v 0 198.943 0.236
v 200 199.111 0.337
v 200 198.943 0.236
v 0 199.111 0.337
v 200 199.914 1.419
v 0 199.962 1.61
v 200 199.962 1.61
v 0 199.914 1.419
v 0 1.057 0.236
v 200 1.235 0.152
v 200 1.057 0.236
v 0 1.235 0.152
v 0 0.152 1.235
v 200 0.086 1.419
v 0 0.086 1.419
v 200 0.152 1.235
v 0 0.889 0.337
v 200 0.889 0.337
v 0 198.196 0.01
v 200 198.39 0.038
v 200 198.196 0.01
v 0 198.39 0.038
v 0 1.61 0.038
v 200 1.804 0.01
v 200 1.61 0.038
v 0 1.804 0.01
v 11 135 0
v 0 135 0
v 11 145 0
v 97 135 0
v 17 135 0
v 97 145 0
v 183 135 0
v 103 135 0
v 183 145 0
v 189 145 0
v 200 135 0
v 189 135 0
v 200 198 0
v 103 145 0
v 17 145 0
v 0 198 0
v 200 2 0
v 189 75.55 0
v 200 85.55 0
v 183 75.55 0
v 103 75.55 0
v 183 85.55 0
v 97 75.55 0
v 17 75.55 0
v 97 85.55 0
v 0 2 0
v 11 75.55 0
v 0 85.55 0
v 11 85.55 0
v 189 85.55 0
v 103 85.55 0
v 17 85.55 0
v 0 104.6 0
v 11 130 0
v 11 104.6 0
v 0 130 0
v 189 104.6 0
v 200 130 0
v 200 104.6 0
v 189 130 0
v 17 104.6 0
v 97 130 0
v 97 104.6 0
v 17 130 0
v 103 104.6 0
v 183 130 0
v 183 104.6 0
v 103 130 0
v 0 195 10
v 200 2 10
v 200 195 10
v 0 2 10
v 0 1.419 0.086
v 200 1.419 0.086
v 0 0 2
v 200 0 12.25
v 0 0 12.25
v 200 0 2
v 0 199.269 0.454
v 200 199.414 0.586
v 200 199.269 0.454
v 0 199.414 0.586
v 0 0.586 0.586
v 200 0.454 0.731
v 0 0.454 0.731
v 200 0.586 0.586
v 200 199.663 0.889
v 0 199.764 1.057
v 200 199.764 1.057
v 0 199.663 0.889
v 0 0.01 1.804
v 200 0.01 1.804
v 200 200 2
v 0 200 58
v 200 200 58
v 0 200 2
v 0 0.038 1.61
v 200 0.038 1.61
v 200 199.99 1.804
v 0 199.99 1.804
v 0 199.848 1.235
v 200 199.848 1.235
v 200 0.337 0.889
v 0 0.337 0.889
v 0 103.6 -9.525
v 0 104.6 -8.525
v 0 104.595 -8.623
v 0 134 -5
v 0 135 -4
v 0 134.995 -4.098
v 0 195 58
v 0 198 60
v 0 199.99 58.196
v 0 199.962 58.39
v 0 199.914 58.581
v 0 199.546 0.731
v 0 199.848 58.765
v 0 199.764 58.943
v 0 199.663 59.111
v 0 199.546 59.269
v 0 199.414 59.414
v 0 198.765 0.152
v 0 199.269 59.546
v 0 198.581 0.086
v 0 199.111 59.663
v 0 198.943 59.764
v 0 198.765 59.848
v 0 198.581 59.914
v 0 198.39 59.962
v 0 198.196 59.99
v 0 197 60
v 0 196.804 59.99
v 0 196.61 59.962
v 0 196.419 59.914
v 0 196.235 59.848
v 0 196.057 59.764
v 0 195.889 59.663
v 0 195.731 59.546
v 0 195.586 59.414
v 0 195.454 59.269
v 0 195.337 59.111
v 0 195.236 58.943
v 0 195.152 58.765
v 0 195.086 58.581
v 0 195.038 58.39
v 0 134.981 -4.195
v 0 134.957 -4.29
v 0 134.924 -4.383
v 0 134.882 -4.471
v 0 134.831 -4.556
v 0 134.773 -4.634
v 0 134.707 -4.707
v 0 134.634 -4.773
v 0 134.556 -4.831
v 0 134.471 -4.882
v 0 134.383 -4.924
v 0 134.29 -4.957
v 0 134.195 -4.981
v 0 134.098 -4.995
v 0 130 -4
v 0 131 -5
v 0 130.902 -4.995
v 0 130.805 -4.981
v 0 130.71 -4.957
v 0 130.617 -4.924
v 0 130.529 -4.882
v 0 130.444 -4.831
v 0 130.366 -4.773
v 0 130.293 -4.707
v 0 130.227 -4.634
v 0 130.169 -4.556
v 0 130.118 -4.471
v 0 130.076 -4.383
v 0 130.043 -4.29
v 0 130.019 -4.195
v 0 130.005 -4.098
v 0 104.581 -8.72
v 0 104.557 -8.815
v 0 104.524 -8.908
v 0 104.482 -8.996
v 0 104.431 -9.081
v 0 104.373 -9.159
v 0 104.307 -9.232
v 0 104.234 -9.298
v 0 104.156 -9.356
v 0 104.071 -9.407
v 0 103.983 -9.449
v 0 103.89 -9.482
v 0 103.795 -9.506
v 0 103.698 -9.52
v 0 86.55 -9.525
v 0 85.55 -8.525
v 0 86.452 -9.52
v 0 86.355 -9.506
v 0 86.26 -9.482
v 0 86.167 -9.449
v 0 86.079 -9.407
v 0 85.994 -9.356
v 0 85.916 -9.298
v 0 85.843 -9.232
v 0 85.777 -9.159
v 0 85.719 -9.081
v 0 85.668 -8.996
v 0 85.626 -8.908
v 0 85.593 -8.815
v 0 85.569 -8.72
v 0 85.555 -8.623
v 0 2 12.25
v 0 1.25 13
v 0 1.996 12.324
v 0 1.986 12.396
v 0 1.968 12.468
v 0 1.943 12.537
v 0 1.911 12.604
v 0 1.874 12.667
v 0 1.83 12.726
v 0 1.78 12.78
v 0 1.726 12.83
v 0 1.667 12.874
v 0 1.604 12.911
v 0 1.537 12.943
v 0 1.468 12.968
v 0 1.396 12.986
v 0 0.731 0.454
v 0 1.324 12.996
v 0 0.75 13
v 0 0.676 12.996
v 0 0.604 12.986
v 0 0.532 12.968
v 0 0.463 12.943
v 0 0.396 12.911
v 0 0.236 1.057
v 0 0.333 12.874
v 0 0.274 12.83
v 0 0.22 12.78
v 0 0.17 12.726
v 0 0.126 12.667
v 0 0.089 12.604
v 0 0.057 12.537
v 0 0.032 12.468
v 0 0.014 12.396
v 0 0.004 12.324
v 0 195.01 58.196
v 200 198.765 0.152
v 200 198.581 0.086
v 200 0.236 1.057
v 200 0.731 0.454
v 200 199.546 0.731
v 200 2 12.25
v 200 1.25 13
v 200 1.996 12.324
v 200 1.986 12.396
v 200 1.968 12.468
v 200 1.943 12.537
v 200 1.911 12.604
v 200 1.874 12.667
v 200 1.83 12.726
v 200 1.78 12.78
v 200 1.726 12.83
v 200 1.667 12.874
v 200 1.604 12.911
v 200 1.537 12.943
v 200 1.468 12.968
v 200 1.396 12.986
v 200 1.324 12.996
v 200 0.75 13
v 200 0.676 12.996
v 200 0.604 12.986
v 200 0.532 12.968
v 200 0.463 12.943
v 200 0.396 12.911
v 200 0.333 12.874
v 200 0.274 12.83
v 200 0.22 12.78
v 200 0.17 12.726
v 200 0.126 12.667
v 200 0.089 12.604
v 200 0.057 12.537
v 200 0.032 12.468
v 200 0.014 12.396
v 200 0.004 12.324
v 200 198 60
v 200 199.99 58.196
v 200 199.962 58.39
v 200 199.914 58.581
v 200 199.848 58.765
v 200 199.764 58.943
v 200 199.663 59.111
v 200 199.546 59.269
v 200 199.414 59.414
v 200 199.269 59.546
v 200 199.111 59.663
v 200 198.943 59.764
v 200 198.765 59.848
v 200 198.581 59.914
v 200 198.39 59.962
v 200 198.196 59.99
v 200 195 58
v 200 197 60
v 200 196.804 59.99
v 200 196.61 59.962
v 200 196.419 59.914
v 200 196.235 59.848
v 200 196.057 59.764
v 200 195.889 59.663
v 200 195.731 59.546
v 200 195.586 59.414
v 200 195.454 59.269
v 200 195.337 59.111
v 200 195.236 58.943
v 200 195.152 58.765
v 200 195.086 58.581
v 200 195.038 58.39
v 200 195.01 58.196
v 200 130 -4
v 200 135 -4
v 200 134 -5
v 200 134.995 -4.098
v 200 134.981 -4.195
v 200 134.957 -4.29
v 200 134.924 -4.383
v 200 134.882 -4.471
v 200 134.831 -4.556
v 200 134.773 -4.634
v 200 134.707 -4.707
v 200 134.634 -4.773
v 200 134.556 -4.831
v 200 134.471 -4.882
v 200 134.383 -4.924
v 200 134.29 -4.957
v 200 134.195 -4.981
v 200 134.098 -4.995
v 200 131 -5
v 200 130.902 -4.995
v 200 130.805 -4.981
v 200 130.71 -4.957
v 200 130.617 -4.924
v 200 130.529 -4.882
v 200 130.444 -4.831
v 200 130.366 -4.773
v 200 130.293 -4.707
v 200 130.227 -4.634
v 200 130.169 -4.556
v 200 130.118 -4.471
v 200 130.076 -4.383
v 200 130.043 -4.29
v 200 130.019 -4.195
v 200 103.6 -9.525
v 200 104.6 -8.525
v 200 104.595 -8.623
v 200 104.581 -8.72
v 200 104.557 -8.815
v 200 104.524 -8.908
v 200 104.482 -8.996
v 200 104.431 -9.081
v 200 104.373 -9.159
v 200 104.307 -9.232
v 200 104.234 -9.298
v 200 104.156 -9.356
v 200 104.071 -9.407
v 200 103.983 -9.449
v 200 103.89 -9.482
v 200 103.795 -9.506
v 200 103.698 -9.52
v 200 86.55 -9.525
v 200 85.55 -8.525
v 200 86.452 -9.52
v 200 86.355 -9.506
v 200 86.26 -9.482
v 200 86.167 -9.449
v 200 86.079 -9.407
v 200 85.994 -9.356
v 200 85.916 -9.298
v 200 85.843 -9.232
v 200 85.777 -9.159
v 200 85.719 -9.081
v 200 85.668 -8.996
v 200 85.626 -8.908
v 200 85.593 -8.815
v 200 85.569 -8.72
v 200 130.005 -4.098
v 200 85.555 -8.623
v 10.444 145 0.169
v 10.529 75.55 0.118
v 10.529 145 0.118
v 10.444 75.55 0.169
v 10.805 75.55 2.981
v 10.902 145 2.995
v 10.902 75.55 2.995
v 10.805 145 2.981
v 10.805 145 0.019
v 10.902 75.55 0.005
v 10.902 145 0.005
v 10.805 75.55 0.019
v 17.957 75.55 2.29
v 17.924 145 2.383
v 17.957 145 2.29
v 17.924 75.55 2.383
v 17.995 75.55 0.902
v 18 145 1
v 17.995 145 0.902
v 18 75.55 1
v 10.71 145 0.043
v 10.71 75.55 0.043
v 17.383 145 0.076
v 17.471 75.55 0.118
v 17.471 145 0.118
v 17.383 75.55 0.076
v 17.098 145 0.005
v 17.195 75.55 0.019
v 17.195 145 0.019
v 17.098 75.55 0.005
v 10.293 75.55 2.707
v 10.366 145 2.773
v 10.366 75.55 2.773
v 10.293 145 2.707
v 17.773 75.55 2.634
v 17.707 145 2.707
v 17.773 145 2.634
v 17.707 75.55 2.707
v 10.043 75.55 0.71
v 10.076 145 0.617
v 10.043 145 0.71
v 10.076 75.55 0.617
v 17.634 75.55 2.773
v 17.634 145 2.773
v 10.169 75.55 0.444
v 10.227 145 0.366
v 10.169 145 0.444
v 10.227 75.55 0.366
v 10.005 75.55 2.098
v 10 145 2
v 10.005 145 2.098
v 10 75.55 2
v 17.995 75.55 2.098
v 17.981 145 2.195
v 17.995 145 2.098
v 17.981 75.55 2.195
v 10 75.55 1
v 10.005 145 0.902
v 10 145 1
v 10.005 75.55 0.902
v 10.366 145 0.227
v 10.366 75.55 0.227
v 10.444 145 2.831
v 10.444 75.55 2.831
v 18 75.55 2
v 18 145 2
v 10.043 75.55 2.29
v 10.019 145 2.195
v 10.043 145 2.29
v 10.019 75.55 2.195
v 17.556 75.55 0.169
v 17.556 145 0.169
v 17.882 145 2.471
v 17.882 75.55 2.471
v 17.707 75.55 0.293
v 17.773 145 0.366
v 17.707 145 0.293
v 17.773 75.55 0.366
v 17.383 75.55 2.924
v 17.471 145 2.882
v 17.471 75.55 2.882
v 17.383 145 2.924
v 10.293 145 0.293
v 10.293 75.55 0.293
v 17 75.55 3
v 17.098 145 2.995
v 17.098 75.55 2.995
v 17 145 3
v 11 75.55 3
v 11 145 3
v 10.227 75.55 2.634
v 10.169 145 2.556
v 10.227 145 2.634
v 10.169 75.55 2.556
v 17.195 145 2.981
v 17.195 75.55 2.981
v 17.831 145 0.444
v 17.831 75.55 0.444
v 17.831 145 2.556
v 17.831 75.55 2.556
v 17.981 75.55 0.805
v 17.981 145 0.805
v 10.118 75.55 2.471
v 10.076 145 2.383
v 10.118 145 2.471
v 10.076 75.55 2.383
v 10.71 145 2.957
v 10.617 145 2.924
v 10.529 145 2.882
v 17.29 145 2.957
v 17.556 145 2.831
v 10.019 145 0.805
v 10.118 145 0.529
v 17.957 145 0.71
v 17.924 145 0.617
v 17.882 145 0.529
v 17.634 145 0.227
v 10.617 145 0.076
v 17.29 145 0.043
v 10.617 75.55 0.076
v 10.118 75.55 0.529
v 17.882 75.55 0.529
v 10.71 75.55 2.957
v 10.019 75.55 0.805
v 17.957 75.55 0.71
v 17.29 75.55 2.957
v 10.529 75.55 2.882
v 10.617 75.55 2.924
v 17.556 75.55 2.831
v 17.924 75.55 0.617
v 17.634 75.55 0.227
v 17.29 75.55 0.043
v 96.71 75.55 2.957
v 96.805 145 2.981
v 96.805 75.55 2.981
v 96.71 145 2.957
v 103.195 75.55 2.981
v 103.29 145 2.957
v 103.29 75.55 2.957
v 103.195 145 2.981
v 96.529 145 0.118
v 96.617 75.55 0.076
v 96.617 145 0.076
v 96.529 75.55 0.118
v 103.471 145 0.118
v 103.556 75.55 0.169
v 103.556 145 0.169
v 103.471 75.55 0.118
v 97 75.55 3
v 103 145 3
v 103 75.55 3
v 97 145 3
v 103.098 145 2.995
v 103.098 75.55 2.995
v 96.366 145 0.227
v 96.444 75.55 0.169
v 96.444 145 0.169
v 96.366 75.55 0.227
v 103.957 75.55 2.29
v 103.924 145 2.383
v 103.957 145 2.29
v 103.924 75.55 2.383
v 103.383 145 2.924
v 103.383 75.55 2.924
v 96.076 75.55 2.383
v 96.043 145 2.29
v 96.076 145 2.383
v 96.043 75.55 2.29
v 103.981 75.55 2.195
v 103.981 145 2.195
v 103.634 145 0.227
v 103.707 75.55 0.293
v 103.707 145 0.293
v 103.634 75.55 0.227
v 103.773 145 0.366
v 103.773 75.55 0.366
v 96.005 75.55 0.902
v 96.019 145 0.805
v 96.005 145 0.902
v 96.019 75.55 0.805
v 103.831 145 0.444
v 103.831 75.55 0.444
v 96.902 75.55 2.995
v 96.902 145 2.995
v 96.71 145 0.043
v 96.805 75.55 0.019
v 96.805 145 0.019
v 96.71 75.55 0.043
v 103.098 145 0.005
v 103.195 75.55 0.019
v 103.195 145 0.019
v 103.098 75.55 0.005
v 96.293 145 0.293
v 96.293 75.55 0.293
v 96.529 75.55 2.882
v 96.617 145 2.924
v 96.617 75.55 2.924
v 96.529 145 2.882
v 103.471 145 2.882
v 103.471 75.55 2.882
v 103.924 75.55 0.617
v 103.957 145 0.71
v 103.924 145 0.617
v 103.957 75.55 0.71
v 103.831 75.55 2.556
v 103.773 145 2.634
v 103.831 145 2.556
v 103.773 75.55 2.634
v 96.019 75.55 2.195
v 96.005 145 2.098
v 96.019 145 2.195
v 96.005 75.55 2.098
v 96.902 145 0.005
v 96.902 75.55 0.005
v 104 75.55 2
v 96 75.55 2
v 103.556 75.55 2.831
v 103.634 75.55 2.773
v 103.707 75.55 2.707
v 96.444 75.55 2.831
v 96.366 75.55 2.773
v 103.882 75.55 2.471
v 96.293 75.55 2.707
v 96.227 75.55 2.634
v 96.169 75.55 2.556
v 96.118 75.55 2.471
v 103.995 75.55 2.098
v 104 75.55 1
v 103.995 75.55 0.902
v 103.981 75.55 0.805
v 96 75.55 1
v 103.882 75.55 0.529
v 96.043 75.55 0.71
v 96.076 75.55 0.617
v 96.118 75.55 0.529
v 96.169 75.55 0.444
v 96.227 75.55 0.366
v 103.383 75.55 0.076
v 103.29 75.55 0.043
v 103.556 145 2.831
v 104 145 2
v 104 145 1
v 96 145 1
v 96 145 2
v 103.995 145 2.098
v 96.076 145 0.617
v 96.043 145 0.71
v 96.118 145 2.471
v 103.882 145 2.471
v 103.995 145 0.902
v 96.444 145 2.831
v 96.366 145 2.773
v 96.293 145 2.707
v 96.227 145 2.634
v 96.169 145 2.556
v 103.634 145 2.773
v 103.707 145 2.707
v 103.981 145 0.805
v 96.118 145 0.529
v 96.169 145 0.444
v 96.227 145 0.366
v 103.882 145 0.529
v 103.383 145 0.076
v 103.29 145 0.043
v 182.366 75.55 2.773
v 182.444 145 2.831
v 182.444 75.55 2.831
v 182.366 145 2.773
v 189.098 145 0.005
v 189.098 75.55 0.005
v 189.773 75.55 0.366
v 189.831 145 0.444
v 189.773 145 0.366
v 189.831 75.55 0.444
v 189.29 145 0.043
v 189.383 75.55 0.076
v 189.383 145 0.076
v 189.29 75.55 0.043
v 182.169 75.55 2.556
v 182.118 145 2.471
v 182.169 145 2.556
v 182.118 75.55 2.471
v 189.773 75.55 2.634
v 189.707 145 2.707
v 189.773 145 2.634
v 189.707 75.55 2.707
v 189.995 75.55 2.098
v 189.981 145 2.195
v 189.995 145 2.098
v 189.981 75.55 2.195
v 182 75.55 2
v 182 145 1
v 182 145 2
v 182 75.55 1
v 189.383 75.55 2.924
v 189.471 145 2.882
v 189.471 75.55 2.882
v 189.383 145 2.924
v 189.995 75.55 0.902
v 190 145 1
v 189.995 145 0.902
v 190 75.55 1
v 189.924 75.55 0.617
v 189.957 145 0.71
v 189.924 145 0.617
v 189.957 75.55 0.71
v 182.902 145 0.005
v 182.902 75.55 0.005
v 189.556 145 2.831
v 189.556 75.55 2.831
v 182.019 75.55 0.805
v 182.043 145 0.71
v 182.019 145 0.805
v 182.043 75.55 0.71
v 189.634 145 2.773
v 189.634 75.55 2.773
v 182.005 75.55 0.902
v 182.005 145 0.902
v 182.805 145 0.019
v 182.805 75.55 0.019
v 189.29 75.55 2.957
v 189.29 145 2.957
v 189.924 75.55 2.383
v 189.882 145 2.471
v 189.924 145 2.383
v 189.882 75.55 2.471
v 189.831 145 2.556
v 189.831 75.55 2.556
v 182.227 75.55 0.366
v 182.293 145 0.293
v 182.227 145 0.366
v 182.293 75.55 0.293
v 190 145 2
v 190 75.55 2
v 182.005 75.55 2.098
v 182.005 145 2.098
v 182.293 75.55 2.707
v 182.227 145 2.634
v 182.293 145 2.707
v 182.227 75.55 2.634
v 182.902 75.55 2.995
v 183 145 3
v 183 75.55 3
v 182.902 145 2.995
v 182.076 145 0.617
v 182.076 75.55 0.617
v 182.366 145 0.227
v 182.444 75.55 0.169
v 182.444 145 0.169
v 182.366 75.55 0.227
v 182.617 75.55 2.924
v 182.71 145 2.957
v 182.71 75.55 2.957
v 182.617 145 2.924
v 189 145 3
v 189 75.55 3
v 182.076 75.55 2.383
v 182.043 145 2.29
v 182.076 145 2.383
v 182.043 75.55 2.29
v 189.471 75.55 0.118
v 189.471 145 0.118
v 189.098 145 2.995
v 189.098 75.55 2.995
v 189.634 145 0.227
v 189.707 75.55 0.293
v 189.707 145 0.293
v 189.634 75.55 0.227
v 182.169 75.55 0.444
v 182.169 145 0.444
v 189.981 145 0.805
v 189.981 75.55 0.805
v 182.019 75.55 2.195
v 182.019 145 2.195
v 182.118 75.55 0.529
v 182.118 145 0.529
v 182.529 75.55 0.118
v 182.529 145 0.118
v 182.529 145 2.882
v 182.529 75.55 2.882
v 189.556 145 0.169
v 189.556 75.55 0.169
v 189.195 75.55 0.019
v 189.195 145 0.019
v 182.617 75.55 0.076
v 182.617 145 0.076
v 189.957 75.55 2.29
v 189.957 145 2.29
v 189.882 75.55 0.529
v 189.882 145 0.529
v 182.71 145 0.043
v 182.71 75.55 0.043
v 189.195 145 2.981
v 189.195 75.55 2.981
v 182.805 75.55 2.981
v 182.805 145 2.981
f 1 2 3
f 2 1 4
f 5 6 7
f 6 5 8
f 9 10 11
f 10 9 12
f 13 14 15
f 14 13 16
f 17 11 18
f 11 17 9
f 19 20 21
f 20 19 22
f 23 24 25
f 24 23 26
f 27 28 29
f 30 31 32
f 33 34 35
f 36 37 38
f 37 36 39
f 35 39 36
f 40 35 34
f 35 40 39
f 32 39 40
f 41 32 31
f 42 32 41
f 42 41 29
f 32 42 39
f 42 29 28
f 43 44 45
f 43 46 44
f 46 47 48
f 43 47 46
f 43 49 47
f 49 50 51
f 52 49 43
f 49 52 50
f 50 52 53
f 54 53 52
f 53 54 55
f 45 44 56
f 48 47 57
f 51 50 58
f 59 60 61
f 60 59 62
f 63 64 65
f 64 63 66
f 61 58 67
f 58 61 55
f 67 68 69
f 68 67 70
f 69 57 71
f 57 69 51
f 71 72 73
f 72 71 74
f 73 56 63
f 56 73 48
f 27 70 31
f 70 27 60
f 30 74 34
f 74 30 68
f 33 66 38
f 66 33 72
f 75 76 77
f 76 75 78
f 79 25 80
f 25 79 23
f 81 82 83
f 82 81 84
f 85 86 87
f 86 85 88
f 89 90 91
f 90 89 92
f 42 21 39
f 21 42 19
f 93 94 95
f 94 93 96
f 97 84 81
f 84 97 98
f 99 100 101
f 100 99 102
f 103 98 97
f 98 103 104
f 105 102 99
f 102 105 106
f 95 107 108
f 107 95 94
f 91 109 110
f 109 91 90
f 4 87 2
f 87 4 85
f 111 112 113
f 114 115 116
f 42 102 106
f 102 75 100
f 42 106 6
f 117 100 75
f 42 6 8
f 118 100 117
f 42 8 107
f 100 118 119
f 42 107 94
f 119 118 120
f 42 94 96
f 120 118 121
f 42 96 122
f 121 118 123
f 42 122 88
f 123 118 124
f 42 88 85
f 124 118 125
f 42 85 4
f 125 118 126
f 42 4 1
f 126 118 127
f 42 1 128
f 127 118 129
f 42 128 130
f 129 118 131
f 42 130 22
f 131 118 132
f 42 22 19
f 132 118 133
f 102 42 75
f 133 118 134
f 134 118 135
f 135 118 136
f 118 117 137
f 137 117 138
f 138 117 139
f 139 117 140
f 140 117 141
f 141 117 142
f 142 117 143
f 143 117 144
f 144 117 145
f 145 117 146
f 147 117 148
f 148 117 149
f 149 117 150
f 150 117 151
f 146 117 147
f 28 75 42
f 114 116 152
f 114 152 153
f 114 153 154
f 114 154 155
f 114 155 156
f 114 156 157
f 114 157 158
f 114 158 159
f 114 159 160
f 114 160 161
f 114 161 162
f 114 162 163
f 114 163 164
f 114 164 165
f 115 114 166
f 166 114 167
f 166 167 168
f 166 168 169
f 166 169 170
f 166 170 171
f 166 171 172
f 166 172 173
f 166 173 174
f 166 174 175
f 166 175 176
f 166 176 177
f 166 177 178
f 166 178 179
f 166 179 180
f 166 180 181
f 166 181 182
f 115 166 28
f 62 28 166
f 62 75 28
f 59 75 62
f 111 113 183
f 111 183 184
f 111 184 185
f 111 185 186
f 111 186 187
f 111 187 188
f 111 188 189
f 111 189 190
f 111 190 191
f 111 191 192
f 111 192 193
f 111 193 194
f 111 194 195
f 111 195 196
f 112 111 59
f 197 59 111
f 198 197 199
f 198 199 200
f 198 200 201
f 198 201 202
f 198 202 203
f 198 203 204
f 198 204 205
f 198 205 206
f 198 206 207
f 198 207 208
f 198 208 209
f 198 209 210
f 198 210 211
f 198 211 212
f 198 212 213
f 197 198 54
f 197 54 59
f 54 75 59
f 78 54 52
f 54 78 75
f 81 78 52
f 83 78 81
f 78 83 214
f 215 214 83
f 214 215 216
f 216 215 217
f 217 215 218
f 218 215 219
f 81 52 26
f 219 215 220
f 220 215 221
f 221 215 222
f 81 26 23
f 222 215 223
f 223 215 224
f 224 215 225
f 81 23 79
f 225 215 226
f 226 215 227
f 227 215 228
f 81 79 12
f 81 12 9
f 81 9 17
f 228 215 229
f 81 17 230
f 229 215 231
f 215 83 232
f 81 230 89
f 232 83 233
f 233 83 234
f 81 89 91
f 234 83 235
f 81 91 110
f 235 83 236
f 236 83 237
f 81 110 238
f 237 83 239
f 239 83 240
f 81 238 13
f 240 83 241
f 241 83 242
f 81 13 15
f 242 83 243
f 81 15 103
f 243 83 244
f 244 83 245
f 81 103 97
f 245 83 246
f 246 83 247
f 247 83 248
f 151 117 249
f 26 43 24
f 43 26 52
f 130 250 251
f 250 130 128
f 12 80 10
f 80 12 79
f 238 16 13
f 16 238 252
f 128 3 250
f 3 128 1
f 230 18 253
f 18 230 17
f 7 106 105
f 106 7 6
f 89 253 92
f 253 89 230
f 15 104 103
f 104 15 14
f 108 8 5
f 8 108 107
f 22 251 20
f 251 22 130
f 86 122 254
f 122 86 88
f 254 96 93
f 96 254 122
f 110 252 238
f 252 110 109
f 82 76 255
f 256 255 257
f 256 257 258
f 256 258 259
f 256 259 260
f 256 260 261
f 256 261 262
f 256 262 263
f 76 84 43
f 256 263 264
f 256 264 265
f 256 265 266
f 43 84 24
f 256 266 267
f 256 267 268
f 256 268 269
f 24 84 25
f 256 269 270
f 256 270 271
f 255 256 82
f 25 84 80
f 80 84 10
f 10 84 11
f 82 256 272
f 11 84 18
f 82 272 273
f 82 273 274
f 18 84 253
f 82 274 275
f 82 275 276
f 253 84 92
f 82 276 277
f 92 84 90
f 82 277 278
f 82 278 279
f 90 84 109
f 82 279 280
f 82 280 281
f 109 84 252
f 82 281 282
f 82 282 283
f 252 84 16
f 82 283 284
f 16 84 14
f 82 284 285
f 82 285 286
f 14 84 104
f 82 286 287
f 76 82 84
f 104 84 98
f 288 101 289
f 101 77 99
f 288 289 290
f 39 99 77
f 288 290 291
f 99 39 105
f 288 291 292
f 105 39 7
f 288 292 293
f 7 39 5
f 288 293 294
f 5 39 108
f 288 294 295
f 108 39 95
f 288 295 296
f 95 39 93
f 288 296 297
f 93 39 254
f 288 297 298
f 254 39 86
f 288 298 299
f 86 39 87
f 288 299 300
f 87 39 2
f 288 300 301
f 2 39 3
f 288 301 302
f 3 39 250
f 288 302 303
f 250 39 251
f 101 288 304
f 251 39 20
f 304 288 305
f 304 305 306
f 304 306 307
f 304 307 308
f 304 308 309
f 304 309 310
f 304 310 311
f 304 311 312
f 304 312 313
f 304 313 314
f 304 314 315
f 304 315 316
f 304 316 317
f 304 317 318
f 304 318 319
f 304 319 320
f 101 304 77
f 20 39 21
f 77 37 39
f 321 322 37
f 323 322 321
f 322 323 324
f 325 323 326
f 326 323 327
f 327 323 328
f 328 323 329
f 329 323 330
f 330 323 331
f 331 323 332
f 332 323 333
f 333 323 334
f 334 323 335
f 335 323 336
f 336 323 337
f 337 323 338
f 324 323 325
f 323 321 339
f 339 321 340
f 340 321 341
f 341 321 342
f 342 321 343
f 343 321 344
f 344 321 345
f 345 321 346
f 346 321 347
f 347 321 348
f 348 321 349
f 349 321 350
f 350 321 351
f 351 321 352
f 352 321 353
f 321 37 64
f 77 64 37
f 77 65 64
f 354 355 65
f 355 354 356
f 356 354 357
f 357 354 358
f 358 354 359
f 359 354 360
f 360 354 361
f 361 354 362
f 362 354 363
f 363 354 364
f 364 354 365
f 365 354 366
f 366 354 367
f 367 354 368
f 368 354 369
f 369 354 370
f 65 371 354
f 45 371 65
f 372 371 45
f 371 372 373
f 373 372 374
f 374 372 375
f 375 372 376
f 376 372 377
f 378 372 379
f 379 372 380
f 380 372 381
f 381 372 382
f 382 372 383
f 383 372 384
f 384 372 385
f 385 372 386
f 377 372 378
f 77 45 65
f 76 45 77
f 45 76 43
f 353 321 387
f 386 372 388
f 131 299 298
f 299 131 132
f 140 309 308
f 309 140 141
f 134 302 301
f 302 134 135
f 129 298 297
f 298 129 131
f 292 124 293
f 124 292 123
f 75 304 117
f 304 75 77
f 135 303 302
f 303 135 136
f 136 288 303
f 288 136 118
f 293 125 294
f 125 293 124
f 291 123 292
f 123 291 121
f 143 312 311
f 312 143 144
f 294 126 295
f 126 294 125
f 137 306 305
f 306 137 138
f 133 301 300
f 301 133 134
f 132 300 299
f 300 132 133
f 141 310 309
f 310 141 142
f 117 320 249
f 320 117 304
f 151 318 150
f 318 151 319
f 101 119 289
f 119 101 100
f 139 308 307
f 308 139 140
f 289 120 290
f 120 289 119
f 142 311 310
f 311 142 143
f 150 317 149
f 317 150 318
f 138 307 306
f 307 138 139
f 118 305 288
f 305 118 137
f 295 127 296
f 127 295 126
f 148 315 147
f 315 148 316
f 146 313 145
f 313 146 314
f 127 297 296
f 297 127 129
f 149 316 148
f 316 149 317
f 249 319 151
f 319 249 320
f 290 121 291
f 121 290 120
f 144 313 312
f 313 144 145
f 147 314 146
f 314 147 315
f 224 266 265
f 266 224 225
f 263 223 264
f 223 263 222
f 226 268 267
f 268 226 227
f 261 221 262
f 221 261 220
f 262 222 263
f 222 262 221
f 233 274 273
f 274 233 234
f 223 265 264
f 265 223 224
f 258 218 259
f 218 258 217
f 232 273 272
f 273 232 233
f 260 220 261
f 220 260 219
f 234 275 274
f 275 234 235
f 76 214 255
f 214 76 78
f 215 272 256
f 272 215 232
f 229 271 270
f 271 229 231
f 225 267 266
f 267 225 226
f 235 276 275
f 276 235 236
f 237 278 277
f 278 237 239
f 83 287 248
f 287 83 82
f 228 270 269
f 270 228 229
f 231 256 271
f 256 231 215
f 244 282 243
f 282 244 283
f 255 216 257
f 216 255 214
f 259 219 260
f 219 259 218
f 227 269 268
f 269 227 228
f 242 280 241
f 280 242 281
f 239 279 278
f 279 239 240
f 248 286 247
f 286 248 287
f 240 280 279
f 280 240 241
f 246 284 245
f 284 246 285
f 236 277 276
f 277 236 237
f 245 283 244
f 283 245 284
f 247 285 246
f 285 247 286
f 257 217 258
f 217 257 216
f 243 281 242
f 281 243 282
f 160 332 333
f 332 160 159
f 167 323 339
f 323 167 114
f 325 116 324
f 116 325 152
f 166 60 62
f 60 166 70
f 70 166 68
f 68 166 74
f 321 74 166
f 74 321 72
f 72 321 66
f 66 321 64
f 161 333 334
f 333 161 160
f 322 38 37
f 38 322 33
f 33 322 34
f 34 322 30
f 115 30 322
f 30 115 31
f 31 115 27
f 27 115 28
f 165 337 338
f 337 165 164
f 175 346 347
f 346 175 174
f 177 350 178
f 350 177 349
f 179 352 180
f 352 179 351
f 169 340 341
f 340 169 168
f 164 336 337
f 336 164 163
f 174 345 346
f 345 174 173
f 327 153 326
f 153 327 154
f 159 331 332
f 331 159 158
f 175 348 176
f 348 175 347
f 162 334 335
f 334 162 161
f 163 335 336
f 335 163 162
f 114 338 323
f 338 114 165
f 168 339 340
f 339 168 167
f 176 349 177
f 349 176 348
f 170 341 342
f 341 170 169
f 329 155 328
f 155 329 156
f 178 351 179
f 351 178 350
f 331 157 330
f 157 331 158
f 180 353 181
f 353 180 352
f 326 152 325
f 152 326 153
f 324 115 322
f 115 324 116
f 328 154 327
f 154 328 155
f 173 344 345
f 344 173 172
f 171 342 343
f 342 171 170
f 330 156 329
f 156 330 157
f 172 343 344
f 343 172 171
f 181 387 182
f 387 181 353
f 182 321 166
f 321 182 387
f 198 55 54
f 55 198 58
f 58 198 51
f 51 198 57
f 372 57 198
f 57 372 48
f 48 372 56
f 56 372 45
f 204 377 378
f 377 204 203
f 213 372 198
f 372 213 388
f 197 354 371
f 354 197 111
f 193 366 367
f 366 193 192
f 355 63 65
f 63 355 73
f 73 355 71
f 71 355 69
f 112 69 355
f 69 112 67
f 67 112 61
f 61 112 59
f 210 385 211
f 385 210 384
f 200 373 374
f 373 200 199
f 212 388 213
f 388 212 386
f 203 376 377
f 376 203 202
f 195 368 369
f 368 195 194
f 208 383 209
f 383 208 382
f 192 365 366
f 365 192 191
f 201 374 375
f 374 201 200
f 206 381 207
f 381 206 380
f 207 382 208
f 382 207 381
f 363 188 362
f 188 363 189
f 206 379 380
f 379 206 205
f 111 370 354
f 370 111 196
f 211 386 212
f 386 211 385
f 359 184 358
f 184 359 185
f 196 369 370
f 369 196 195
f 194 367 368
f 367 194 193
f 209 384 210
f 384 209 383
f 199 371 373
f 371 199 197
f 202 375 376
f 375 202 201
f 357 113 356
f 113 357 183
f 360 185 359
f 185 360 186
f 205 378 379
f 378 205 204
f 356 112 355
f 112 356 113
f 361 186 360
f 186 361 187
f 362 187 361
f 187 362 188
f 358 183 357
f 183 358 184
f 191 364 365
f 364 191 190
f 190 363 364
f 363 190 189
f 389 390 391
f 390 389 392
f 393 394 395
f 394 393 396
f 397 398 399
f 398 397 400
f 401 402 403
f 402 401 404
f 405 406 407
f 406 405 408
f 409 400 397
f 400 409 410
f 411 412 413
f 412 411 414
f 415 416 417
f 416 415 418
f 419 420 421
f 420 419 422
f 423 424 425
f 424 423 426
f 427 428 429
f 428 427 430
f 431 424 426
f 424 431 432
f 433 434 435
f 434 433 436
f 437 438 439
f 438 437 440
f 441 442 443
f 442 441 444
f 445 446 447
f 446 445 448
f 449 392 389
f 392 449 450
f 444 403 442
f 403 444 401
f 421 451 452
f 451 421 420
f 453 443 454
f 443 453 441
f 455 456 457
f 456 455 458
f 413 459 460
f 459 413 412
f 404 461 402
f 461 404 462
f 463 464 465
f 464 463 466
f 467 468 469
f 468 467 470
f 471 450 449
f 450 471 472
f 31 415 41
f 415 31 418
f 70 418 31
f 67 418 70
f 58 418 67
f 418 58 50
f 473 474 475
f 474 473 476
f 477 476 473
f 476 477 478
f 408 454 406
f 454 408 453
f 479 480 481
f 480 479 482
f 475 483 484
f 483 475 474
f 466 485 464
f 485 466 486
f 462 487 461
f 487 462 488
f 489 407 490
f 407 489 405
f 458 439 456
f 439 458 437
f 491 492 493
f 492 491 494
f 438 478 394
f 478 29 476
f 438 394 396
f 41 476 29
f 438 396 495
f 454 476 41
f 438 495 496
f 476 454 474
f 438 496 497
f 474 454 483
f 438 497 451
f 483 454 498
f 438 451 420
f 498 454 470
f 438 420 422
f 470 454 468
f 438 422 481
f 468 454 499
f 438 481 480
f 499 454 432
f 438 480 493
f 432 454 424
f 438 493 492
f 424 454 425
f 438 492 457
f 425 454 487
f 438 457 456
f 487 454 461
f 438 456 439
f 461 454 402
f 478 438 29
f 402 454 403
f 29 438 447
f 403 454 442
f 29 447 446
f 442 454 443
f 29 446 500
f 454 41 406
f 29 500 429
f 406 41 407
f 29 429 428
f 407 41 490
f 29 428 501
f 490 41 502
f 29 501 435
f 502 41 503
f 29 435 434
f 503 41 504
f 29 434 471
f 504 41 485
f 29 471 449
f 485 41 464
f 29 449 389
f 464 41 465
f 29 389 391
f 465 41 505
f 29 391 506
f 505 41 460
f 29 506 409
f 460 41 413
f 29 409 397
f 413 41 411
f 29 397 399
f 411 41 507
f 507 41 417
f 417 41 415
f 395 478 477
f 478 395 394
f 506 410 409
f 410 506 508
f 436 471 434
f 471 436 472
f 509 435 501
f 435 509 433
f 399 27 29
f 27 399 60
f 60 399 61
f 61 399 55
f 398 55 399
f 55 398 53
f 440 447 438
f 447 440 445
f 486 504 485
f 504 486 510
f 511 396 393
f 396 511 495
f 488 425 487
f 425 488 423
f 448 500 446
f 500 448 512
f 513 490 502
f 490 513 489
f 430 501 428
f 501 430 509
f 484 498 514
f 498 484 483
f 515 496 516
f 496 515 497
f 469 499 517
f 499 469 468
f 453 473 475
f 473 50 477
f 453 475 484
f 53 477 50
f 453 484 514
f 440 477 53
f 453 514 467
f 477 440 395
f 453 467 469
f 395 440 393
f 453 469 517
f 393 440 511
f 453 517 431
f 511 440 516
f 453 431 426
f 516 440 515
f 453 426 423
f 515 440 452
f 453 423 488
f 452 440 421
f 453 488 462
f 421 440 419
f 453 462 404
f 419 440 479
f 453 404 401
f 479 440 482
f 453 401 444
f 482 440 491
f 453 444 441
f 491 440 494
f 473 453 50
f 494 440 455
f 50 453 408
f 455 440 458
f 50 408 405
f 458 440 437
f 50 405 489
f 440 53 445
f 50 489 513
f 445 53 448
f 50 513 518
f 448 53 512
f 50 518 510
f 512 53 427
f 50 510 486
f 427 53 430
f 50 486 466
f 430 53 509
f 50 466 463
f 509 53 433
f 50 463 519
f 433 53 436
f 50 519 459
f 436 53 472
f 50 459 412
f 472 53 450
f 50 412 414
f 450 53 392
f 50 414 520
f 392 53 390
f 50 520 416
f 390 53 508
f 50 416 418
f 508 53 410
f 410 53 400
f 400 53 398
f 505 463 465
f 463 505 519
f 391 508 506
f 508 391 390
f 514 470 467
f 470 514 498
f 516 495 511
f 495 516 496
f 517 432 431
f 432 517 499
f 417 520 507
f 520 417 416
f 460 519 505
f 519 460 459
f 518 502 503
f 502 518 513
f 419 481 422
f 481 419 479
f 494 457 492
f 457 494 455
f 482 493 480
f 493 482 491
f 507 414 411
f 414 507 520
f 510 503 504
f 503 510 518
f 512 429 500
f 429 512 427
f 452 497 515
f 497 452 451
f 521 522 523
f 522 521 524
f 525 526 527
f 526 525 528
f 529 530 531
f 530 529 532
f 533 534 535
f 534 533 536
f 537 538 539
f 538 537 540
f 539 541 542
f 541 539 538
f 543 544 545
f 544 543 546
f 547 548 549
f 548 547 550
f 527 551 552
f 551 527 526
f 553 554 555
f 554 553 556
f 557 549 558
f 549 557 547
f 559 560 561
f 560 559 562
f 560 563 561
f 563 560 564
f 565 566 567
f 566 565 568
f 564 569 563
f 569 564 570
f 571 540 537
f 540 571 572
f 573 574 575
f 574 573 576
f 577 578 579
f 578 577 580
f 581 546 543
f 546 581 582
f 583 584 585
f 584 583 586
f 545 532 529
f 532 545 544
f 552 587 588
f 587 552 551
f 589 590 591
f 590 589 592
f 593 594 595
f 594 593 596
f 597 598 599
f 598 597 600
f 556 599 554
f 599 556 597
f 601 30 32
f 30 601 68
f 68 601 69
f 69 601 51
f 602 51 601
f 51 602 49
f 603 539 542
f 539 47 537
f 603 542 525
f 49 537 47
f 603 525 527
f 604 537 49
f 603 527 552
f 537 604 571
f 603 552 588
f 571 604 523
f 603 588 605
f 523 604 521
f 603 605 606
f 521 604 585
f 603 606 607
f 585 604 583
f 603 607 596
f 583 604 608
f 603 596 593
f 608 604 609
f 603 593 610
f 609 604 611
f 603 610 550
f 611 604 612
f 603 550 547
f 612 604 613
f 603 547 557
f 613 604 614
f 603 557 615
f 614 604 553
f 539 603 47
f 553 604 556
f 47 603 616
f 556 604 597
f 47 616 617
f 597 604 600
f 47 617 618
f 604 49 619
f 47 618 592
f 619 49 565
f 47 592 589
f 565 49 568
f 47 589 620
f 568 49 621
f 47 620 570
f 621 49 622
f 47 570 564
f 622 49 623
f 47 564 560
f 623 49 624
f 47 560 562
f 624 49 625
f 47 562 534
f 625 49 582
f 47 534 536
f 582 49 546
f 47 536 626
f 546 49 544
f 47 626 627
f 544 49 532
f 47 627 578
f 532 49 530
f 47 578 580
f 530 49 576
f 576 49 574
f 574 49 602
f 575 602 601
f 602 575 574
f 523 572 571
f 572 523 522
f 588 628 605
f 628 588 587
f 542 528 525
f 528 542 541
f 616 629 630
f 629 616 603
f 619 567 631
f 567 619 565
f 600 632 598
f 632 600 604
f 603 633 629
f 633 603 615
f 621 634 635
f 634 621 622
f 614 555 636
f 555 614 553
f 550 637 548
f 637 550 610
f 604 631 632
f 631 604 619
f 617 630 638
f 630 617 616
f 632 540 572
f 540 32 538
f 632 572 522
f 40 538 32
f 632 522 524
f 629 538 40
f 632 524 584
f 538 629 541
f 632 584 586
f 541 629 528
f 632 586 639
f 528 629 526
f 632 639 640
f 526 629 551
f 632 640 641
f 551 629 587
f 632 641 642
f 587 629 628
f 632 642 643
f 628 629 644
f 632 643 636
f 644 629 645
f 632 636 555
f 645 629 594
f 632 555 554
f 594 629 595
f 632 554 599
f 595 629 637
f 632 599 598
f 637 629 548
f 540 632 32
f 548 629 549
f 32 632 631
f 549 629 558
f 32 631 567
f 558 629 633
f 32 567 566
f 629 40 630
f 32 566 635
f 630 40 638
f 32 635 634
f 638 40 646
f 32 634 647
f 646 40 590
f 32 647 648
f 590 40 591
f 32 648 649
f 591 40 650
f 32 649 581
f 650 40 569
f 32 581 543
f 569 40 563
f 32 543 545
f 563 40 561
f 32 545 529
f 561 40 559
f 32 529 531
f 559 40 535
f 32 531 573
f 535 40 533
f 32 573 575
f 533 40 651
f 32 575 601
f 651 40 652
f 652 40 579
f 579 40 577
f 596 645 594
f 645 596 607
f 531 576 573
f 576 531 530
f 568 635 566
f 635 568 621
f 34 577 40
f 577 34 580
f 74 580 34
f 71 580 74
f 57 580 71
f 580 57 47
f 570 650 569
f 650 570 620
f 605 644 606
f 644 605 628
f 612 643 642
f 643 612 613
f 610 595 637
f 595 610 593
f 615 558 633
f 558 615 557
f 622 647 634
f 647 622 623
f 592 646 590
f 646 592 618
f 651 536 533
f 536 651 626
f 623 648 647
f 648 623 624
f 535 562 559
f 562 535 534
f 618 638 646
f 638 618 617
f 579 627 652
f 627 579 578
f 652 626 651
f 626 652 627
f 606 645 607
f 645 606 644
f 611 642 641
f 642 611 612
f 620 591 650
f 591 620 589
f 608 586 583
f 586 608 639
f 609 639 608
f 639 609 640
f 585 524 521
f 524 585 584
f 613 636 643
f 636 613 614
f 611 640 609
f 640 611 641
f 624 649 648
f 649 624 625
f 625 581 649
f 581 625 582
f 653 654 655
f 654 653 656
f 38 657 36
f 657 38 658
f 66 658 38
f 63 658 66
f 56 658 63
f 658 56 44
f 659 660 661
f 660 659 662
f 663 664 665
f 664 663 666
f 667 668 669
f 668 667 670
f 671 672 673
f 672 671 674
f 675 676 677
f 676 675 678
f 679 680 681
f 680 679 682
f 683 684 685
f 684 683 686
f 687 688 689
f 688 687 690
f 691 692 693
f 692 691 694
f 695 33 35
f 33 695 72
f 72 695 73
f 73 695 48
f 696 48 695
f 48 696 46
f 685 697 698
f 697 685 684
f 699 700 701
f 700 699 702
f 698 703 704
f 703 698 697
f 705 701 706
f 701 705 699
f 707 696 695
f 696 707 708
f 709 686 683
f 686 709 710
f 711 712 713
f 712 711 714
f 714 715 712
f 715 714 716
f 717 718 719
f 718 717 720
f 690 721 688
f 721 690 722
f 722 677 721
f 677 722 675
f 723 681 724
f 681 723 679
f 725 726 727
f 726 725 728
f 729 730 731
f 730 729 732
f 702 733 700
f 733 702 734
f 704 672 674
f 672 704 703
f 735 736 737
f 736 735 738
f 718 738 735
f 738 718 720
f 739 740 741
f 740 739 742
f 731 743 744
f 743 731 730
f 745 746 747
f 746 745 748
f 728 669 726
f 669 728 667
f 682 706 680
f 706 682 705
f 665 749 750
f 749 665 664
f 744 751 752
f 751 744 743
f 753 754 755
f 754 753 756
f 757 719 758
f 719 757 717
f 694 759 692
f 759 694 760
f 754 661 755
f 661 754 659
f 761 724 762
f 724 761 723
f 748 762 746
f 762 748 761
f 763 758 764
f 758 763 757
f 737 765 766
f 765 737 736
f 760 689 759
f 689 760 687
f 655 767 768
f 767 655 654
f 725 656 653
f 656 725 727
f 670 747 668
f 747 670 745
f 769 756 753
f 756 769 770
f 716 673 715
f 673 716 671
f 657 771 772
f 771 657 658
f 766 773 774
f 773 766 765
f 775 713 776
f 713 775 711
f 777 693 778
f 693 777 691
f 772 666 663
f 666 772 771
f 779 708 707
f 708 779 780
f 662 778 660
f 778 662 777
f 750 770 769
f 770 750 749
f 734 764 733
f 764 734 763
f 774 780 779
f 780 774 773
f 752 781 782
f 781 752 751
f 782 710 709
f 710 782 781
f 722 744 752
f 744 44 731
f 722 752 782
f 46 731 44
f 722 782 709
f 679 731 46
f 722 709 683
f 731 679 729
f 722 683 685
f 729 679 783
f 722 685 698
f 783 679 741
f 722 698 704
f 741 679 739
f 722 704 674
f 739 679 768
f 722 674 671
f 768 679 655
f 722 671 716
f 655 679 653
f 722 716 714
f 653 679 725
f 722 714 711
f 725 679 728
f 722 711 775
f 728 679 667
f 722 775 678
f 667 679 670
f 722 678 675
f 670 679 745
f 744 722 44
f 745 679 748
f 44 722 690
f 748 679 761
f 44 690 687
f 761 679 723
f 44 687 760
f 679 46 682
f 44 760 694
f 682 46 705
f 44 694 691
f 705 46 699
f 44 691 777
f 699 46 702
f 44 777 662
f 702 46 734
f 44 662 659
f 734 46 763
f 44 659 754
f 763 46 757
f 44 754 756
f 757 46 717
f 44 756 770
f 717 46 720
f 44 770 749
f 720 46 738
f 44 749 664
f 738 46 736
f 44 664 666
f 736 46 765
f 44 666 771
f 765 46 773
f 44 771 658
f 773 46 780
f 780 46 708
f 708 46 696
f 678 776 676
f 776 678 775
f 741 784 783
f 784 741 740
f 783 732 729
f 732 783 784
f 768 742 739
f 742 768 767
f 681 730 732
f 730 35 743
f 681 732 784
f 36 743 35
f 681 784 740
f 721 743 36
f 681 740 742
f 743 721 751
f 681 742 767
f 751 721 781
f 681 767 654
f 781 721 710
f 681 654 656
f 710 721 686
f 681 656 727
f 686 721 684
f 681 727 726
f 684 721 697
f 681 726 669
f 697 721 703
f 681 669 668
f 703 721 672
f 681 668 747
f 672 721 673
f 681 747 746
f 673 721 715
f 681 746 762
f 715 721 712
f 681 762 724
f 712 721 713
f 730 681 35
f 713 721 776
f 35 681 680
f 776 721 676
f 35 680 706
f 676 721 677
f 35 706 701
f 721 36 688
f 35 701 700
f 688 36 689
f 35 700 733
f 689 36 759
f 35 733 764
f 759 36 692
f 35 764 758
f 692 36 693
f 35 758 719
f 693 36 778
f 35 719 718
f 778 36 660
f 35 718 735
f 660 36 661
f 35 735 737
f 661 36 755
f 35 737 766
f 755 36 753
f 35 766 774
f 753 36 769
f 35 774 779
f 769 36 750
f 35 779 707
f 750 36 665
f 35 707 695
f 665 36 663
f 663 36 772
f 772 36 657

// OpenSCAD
// file: 72-inch-cosco-profile.scad
// 72-inch Cosco shelf profile.
//
// Overrides the bar / front-lip dimensions in bar_shelf.scad to fit a
// 72-inch Cosco shelving rail. Include this BEFORE bar_shelf.scad in any
// wrapper that should use the Cosco profile.
border_ridge_override     = 25.4;    // 1"
border_depth_override     = 19.05;   // 3/4"
border_height_override    = 9.525;   // 3/8"
rear_wall_height_override = 5;       // shorter rear lip than 77-inch industrial
// main file
// 200mm-wide x 200mm-deep 72-inch Cosco shelf — see bar_shelf.scad for the design.
include <72-inch-cosco-profile.scad>
shelf_width_override = 200;
shelf_depth_override = 200;
include <bar_shelf.scad>
